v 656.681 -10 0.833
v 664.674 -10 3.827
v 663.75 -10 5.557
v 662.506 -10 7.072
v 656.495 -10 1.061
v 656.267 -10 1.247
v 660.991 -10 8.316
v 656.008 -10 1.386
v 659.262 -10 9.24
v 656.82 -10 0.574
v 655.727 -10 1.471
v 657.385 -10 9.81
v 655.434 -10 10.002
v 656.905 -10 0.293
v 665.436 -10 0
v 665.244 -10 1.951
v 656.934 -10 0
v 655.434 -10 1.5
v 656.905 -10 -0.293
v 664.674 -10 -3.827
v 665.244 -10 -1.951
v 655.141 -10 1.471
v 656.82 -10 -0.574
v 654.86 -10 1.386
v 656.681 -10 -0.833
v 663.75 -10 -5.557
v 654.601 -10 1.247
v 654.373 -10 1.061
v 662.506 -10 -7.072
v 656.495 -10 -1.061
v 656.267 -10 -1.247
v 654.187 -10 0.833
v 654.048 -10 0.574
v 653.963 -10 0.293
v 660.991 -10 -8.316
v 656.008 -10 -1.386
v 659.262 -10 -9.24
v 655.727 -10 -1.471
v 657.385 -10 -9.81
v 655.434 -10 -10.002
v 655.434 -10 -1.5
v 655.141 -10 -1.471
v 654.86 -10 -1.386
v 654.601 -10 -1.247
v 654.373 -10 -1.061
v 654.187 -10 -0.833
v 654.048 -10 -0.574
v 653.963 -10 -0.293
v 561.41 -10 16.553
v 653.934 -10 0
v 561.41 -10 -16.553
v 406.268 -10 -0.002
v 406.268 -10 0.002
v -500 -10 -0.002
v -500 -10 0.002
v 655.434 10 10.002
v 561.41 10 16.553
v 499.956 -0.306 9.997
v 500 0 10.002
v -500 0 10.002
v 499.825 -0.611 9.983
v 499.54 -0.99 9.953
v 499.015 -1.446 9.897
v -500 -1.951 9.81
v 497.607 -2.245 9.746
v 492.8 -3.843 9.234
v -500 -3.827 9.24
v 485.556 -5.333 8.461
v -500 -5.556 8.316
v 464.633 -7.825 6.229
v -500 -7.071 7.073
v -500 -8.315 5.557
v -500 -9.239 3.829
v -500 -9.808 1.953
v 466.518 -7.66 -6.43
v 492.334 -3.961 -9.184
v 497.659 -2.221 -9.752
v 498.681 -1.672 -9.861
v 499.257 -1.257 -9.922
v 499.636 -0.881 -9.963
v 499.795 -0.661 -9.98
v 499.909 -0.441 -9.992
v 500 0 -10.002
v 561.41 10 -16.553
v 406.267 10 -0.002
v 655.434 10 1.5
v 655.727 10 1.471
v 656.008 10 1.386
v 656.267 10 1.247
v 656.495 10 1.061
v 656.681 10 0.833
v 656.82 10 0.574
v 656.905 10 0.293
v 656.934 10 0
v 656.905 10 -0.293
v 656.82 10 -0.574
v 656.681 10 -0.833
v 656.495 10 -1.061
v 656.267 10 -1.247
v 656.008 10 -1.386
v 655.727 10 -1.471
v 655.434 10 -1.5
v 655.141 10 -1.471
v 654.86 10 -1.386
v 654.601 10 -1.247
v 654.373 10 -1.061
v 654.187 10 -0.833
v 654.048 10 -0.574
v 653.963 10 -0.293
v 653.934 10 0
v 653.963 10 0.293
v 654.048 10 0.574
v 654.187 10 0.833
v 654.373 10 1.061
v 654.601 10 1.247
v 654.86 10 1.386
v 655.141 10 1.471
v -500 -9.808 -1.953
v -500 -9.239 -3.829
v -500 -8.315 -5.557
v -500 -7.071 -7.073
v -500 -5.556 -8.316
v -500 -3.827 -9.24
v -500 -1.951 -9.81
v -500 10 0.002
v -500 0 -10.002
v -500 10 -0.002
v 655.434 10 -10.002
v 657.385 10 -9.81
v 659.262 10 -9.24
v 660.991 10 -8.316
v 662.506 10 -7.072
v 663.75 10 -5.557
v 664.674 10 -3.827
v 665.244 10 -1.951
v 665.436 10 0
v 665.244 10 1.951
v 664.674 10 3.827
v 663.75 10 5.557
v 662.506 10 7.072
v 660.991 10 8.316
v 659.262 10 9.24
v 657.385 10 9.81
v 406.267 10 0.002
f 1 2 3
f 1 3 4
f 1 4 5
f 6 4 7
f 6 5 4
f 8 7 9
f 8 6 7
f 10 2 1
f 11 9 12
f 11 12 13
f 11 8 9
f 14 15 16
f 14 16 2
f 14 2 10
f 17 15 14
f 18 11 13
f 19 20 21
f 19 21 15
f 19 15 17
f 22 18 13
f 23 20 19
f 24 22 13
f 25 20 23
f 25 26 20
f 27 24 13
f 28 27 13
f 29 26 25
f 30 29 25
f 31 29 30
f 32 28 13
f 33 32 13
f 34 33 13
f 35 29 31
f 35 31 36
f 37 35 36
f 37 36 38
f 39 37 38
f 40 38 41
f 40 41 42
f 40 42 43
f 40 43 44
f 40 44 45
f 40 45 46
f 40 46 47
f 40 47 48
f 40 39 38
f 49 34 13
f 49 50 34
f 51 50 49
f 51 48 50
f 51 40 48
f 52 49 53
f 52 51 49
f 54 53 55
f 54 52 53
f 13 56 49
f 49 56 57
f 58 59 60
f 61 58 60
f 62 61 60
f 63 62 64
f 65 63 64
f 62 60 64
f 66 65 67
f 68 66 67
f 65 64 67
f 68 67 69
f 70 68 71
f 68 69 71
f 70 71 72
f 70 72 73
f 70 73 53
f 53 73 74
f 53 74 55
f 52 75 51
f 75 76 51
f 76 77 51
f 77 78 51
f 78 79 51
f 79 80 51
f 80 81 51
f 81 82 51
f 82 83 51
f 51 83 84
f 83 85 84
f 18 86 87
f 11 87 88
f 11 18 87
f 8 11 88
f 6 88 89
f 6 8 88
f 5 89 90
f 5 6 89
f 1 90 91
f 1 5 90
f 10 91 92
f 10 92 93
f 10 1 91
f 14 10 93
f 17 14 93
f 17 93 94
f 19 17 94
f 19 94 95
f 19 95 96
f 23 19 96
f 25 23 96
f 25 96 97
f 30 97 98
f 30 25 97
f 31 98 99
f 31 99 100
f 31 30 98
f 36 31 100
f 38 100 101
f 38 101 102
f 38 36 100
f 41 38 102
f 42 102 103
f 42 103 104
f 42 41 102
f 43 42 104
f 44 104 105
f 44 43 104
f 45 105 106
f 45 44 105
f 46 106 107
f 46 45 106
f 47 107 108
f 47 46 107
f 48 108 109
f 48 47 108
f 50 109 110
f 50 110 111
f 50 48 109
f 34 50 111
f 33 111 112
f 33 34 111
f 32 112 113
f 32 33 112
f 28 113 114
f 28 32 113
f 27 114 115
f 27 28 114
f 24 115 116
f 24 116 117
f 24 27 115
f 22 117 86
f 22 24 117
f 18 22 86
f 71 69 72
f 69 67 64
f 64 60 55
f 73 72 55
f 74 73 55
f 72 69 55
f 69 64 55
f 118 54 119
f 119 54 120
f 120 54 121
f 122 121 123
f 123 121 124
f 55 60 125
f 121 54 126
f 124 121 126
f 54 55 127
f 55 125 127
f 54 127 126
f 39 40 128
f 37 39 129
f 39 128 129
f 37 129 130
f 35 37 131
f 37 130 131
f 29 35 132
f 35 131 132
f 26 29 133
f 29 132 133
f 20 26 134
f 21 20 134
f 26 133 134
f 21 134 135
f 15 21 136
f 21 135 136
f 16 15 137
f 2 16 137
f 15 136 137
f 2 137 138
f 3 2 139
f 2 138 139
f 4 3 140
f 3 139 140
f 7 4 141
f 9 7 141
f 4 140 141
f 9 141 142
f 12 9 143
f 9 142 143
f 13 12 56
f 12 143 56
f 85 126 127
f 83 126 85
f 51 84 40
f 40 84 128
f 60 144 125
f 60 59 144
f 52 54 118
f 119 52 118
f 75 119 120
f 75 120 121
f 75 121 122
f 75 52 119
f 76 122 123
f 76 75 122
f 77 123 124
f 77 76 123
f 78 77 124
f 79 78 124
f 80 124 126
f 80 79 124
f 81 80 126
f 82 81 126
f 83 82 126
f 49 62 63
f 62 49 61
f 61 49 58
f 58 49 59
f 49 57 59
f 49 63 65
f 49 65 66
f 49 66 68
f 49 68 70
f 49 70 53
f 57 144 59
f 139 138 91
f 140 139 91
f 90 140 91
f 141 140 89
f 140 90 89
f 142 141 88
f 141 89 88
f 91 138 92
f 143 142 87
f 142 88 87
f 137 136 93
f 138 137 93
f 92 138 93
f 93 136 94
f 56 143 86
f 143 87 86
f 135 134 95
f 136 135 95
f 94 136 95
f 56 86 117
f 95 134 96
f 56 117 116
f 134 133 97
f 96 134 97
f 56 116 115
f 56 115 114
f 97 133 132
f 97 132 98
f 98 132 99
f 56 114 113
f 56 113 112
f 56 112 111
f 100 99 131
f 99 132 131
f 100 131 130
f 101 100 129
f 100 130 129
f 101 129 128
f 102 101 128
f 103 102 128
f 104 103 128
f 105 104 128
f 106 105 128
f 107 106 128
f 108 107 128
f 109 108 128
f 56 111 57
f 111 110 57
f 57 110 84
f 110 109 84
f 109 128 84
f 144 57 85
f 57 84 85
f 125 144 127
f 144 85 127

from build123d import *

# Parameters (mm, degrees)
SKETCH1_R           = 1.5
BOSS_EXTRUDE1_DEPTH = 10
CHAMFER1_SIZE       = 10
FILLET1_R           = 10


with BuildPart() as part:
    # Sketch1 → Boss-Extrude1 (new, symmetric)
    with BuildSketch(Plane(origin=(0, 0, 0), x_dir=(1, 0, 0), z_dir=(0, 1, 0))):
        with BuildLine():
            Line((500, 10.00169637), (561.410175266, 16.553276436))
            Line((561.410175266, 16.553276436), (655.434048607, 10.00169637))
            ThreePointArc((655.434048607, 10.00169637), (665.435744977, 0), (655.434048607, -10.00169637))
            Line((655.434048607, -10.00169637), (561.410175266, -16.553276436))
            Line((561.410175266, -16.553276436), (500, -10.00169637))
            Line((500, -10.00169637), (-500, -10.00169637))
            Line((-500, -10.00169637), (-500, 10.00169637))
            Line((-500, 10.00169637), (500, 10.00169637))
        make_face()
        with Locations(Location((655.434048607, 0, 0), (0, 0, 270))):
            Circle(SKETCH1_R, mode=Mode.SUBTRACT)
    extrude(amount=BOSS_EXTRUDE1_DEPTH, both=True)

    # Chamfer1
    chamfer1_edges = [part.edges().sort_by_distance(p)[0] for p in [
        (0, 10, -10.00169637),
        (0, 10, 10.00169637),
    ]]
    chamfer(chamfer1_edges, length=CHAMFER1_SIZE)

    # Fillet1
    fillet1_edges = [part.edges().sort_by_distance(p)[0] for p in [
        (0, -10, 10.00169637),
        (0, -10, -10.00169637),
    ]]
    fillet(fillet1_edges, radius=FILLET1_R - 0.0001)  # a hair under: the kernel refuses the full size


solid = part.part
